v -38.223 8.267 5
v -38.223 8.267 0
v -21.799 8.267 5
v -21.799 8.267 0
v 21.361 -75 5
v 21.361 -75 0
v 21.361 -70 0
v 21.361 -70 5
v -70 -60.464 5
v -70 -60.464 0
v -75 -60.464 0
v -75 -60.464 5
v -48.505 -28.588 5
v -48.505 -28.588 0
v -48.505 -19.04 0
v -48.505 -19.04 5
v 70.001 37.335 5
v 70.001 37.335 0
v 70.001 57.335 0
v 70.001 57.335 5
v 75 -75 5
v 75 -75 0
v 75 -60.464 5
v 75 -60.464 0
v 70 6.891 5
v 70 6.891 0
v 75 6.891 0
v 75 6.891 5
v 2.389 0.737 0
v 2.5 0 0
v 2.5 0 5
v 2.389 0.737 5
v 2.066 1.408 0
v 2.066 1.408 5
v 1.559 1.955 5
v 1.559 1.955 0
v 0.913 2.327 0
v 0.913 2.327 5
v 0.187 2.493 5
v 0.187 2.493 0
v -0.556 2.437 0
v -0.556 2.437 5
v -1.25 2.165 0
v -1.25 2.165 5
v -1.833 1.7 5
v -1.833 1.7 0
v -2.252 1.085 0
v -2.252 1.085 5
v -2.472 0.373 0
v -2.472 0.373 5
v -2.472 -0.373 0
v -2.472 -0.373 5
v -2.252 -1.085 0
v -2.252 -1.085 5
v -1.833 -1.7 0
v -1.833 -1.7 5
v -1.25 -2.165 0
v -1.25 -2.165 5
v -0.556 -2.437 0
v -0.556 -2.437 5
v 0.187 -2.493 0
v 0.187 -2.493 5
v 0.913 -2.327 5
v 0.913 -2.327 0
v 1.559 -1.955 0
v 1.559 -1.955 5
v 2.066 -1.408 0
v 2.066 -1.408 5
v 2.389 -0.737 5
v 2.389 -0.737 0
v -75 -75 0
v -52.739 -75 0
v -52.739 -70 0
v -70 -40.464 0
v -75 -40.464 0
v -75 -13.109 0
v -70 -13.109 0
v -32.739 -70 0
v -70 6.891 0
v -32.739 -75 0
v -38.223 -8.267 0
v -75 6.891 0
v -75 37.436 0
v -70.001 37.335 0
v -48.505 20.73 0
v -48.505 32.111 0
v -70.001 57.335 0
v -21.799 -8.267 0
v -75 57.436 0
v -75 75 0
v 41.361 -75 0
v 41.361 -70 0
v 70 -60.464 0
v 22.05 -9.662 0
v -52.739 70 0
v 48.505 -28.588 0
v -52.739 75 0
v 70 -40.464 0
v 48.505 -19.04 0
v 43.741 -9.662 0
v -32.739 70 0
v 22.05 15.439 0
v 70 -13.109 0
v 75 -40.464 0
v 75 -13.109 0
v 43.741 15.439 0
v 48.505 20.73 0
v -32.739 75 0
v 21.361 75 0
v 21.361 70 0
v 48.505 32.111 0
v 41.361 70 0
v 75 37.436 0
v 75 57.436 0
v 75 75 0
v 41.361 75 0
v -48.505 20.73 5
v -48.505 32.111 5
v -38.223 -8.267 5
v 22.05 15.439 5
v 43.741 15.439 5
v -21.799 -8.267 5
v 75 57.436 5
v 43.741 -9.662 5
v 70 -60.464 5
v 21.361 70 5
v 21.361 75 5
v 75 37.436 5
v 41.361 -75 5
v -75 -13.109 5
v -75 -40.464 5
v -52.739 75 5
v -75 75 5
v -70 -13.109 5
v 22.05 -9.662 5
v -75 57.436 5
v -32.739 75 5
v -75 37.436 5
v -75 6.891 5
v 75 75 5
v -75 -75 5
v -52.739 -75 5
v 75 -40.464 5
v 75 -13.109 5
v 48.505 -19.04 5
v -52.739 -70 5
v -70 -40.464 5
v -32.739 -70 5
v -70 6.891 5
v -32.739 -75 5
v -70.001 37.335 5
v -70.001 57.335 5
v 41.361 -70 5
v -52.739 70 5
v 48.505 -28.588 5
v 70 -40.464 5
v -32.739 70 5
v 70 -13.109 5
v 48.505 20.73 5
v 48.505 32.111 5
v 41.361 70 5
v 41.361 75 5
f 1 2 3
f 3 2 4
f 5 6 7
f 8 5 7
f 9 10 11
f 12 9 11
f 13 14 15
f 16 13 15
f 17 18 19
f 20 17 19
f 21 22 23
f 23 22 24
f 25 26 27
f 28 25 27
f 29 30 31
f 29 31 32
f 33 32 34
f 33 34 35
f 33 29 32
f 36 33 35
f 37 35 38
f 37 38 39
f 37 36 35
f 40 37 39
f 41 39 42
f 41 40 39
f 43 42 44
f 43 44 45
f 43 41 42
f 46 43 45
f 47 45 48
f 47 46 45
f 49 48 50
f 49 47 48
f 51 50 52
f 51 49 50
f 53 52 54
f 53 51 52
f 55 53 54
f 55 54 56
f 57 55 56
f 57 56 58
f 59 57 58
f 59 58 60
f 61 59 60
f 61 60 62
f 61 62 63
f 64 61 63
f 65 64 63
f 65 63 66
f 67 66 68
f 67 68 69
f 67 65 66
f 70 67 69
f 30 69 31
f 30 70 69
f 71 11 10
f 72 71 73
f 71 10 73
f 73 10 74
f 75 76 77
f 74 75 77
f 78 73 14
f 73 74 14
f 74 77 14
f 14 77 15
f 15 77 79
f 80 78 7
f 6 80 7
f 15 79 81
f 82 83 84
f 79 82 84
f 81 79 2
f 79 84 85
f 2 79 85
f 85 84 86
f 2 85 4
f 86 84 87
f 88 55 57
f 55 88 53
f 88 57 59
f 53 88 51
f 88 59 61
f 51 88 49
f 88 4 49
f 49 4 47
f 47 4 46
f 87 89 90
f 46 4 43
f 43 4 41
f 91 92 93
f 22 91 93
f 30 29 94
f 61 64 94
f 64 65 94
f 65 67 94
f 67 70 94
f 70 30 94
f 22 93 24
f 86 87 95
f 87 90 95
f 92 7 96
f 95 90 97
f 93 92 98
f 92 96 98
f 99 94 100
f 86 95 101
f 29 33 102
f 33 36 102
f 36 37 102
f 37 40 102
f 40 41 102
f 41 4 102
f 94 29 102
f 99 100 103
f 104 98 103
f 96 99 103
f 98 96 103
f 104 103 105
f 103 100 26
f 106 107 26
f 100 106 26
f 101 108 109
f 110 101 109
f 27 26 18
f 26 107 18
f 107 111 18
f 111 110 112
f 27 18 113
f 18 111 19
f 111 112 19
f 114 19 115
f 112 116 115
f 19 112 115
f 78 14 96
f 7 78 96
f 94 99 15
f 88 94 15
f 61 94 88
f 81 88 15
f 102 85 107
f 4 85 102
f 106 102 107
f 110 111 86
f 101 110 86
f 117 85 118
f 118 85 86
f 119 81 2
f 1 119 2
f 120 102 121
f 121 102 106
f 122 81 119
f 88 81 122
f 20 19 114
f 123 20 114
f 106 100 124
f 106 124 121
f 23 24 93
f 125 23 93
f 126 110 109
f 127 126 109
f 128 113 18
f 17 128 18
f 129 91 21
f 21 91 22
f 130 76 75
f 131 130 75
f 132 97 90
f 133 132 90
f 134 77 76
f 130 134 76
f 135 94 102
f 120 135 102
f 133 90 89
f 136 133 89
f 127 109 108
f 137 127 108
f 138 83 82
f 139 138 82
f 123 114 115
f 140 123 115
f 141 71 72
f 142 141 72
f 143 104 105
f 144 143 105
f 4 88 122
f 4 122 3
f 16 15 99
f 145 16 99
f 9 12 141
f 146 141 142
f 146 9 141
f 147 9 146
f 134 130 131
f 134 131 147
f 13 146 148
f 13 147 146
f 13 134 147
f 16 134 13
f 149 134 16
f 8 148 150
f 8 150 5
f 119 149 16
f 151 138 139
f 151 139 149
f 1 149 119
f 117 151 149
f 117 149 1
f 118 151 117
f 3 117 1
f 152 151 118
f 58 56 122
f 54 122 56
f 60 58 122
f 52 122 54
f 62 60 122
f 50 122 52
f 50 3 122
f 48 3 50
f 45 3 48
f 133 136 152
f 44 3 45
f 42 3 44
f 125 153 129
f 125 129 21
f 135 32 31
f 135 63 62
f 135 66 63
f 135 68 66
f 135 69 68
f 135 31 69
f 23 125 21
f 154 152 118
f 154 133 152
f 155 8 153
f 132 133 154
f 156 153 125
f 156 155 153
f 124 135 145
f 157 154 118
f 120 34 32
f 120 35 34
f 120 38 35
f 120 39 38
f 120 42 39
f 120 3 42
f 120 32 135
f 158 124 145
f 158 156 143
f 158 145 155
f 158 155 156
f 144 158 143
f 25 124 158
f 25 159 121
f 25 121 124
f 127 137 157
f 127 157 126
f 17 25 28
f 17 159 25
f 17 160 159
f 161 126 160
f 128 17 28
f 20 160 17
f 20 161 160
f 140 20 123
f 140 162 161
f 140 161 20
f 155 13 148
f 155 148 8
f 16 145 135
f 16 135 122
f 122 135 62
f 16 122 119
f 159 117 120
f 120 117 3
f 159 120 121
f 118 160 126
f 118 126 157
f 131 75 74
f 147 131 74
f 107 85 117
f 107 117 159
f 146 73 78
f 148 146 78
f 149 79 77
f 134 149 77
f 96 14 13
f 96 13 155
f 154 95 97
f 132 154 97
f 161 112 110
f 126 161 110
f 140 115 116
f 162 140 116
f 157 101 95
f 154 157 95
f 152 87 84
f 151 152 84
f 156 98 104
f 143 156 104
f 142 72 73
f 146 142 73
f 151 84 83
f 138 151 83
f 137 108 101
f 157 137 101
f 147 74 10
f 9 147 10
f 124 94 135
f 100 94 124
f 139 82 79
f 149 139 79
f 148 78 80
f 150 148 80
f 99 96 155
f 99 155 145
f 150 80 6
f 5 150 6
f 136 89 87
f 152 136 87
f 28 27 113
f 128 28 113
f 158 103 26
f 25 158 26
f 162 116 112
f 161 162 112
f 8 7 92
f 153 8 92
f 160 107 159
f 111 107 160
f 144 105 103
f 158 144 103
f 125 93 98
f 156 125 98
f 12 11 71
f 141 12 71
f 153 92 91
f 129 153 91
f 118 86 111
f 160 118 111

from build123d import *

# Parameters (mm, degrees)
SKETCH1_R           = 2.5
SKETCH1_W           = 97.010301716
SKETCH1_H           = 11.381096849
SKETCH1_H_2         = 9.548114026
SKETCH1_W_2         = 16.423850042
SKETCH1_H_3         = 16.534248646
SKETCH1_W_3         = 21.691877415
SKETCH1_H_4         = 25.100601008
BOSS_EXTRUDE1_DEPTH = 5


with BuildPart() as part:
    # Sketch1 → Boss-Extrude1 (new body)
    with BuildSketch(Plane.XY):
        Polygon((-75, -75), (-52.738744268, -75), (-52.738744268, -70), (-32.738744268, -70), (-32.738744268, -75), (21.360897281, -75), (21.360897281, -70), (41.360897281, -70), (41.360897281, -75), (75, -75), (75, -60.464153422), (70, -60.464153422), (70, -40.464153422), (75, -40.464153422), (75, -13.109084485), (70, -13.109084485), (70, 6.890915515), (75, 6.890915515), (75, 37.435704121), (70.001007164, 37.335351613), (70.001007164, 57.335351613), (75, 57.435704121), (75, 75), (41.360897281, 75), (41.360897281, 70), (21.360897281, 70), (21.360897281, 75), (-32.738744268, 75), (-32.738744268, 70), (-52.738744268, 70), (-52.738744268, 75), (-75, 75), (-75, 57.435704121), (-70.001007164, 57.335351613), (-70.001007164, 37.335351613), (-75, 37.435704121), (-75, 6.890915515), (-70, 6.890915515), (-70, -13.109084485), (-75, -13.109084485), (-75, -40.464153422), (-70, -40.464153422), (-70, -60.464153422), (-75, -60.464153422), align=None)
        Circle(SKETCH1_R, mode=Mode.SUBTRACT)
        with Locations((0, 26.4204034)):
            Rectangle(SKETCH1_W, SKETCH1_H, mode=Mode.SUBTRACT)
        with Locations((0, -23.814174359)):
            Rectangle(SKETCH1_W, SKETCH1_H_2, mode=Mode.SUBTRACT)
        with Locations((-30.010920628, 0)):
            Rectangle(SKETCH1_W_2, SKETCH1_H_3, mode=Mode.SUBTRACT)
        with Locations((32.895523873, 2.888698347)):
            Rectangle(SKETCH1_W_3, SKETCH1_H_4, mode=Mode.SUBTRACT)
    extrude(amount=BOSS_EXTRUDE1_DEPTH)


solid = part.part
